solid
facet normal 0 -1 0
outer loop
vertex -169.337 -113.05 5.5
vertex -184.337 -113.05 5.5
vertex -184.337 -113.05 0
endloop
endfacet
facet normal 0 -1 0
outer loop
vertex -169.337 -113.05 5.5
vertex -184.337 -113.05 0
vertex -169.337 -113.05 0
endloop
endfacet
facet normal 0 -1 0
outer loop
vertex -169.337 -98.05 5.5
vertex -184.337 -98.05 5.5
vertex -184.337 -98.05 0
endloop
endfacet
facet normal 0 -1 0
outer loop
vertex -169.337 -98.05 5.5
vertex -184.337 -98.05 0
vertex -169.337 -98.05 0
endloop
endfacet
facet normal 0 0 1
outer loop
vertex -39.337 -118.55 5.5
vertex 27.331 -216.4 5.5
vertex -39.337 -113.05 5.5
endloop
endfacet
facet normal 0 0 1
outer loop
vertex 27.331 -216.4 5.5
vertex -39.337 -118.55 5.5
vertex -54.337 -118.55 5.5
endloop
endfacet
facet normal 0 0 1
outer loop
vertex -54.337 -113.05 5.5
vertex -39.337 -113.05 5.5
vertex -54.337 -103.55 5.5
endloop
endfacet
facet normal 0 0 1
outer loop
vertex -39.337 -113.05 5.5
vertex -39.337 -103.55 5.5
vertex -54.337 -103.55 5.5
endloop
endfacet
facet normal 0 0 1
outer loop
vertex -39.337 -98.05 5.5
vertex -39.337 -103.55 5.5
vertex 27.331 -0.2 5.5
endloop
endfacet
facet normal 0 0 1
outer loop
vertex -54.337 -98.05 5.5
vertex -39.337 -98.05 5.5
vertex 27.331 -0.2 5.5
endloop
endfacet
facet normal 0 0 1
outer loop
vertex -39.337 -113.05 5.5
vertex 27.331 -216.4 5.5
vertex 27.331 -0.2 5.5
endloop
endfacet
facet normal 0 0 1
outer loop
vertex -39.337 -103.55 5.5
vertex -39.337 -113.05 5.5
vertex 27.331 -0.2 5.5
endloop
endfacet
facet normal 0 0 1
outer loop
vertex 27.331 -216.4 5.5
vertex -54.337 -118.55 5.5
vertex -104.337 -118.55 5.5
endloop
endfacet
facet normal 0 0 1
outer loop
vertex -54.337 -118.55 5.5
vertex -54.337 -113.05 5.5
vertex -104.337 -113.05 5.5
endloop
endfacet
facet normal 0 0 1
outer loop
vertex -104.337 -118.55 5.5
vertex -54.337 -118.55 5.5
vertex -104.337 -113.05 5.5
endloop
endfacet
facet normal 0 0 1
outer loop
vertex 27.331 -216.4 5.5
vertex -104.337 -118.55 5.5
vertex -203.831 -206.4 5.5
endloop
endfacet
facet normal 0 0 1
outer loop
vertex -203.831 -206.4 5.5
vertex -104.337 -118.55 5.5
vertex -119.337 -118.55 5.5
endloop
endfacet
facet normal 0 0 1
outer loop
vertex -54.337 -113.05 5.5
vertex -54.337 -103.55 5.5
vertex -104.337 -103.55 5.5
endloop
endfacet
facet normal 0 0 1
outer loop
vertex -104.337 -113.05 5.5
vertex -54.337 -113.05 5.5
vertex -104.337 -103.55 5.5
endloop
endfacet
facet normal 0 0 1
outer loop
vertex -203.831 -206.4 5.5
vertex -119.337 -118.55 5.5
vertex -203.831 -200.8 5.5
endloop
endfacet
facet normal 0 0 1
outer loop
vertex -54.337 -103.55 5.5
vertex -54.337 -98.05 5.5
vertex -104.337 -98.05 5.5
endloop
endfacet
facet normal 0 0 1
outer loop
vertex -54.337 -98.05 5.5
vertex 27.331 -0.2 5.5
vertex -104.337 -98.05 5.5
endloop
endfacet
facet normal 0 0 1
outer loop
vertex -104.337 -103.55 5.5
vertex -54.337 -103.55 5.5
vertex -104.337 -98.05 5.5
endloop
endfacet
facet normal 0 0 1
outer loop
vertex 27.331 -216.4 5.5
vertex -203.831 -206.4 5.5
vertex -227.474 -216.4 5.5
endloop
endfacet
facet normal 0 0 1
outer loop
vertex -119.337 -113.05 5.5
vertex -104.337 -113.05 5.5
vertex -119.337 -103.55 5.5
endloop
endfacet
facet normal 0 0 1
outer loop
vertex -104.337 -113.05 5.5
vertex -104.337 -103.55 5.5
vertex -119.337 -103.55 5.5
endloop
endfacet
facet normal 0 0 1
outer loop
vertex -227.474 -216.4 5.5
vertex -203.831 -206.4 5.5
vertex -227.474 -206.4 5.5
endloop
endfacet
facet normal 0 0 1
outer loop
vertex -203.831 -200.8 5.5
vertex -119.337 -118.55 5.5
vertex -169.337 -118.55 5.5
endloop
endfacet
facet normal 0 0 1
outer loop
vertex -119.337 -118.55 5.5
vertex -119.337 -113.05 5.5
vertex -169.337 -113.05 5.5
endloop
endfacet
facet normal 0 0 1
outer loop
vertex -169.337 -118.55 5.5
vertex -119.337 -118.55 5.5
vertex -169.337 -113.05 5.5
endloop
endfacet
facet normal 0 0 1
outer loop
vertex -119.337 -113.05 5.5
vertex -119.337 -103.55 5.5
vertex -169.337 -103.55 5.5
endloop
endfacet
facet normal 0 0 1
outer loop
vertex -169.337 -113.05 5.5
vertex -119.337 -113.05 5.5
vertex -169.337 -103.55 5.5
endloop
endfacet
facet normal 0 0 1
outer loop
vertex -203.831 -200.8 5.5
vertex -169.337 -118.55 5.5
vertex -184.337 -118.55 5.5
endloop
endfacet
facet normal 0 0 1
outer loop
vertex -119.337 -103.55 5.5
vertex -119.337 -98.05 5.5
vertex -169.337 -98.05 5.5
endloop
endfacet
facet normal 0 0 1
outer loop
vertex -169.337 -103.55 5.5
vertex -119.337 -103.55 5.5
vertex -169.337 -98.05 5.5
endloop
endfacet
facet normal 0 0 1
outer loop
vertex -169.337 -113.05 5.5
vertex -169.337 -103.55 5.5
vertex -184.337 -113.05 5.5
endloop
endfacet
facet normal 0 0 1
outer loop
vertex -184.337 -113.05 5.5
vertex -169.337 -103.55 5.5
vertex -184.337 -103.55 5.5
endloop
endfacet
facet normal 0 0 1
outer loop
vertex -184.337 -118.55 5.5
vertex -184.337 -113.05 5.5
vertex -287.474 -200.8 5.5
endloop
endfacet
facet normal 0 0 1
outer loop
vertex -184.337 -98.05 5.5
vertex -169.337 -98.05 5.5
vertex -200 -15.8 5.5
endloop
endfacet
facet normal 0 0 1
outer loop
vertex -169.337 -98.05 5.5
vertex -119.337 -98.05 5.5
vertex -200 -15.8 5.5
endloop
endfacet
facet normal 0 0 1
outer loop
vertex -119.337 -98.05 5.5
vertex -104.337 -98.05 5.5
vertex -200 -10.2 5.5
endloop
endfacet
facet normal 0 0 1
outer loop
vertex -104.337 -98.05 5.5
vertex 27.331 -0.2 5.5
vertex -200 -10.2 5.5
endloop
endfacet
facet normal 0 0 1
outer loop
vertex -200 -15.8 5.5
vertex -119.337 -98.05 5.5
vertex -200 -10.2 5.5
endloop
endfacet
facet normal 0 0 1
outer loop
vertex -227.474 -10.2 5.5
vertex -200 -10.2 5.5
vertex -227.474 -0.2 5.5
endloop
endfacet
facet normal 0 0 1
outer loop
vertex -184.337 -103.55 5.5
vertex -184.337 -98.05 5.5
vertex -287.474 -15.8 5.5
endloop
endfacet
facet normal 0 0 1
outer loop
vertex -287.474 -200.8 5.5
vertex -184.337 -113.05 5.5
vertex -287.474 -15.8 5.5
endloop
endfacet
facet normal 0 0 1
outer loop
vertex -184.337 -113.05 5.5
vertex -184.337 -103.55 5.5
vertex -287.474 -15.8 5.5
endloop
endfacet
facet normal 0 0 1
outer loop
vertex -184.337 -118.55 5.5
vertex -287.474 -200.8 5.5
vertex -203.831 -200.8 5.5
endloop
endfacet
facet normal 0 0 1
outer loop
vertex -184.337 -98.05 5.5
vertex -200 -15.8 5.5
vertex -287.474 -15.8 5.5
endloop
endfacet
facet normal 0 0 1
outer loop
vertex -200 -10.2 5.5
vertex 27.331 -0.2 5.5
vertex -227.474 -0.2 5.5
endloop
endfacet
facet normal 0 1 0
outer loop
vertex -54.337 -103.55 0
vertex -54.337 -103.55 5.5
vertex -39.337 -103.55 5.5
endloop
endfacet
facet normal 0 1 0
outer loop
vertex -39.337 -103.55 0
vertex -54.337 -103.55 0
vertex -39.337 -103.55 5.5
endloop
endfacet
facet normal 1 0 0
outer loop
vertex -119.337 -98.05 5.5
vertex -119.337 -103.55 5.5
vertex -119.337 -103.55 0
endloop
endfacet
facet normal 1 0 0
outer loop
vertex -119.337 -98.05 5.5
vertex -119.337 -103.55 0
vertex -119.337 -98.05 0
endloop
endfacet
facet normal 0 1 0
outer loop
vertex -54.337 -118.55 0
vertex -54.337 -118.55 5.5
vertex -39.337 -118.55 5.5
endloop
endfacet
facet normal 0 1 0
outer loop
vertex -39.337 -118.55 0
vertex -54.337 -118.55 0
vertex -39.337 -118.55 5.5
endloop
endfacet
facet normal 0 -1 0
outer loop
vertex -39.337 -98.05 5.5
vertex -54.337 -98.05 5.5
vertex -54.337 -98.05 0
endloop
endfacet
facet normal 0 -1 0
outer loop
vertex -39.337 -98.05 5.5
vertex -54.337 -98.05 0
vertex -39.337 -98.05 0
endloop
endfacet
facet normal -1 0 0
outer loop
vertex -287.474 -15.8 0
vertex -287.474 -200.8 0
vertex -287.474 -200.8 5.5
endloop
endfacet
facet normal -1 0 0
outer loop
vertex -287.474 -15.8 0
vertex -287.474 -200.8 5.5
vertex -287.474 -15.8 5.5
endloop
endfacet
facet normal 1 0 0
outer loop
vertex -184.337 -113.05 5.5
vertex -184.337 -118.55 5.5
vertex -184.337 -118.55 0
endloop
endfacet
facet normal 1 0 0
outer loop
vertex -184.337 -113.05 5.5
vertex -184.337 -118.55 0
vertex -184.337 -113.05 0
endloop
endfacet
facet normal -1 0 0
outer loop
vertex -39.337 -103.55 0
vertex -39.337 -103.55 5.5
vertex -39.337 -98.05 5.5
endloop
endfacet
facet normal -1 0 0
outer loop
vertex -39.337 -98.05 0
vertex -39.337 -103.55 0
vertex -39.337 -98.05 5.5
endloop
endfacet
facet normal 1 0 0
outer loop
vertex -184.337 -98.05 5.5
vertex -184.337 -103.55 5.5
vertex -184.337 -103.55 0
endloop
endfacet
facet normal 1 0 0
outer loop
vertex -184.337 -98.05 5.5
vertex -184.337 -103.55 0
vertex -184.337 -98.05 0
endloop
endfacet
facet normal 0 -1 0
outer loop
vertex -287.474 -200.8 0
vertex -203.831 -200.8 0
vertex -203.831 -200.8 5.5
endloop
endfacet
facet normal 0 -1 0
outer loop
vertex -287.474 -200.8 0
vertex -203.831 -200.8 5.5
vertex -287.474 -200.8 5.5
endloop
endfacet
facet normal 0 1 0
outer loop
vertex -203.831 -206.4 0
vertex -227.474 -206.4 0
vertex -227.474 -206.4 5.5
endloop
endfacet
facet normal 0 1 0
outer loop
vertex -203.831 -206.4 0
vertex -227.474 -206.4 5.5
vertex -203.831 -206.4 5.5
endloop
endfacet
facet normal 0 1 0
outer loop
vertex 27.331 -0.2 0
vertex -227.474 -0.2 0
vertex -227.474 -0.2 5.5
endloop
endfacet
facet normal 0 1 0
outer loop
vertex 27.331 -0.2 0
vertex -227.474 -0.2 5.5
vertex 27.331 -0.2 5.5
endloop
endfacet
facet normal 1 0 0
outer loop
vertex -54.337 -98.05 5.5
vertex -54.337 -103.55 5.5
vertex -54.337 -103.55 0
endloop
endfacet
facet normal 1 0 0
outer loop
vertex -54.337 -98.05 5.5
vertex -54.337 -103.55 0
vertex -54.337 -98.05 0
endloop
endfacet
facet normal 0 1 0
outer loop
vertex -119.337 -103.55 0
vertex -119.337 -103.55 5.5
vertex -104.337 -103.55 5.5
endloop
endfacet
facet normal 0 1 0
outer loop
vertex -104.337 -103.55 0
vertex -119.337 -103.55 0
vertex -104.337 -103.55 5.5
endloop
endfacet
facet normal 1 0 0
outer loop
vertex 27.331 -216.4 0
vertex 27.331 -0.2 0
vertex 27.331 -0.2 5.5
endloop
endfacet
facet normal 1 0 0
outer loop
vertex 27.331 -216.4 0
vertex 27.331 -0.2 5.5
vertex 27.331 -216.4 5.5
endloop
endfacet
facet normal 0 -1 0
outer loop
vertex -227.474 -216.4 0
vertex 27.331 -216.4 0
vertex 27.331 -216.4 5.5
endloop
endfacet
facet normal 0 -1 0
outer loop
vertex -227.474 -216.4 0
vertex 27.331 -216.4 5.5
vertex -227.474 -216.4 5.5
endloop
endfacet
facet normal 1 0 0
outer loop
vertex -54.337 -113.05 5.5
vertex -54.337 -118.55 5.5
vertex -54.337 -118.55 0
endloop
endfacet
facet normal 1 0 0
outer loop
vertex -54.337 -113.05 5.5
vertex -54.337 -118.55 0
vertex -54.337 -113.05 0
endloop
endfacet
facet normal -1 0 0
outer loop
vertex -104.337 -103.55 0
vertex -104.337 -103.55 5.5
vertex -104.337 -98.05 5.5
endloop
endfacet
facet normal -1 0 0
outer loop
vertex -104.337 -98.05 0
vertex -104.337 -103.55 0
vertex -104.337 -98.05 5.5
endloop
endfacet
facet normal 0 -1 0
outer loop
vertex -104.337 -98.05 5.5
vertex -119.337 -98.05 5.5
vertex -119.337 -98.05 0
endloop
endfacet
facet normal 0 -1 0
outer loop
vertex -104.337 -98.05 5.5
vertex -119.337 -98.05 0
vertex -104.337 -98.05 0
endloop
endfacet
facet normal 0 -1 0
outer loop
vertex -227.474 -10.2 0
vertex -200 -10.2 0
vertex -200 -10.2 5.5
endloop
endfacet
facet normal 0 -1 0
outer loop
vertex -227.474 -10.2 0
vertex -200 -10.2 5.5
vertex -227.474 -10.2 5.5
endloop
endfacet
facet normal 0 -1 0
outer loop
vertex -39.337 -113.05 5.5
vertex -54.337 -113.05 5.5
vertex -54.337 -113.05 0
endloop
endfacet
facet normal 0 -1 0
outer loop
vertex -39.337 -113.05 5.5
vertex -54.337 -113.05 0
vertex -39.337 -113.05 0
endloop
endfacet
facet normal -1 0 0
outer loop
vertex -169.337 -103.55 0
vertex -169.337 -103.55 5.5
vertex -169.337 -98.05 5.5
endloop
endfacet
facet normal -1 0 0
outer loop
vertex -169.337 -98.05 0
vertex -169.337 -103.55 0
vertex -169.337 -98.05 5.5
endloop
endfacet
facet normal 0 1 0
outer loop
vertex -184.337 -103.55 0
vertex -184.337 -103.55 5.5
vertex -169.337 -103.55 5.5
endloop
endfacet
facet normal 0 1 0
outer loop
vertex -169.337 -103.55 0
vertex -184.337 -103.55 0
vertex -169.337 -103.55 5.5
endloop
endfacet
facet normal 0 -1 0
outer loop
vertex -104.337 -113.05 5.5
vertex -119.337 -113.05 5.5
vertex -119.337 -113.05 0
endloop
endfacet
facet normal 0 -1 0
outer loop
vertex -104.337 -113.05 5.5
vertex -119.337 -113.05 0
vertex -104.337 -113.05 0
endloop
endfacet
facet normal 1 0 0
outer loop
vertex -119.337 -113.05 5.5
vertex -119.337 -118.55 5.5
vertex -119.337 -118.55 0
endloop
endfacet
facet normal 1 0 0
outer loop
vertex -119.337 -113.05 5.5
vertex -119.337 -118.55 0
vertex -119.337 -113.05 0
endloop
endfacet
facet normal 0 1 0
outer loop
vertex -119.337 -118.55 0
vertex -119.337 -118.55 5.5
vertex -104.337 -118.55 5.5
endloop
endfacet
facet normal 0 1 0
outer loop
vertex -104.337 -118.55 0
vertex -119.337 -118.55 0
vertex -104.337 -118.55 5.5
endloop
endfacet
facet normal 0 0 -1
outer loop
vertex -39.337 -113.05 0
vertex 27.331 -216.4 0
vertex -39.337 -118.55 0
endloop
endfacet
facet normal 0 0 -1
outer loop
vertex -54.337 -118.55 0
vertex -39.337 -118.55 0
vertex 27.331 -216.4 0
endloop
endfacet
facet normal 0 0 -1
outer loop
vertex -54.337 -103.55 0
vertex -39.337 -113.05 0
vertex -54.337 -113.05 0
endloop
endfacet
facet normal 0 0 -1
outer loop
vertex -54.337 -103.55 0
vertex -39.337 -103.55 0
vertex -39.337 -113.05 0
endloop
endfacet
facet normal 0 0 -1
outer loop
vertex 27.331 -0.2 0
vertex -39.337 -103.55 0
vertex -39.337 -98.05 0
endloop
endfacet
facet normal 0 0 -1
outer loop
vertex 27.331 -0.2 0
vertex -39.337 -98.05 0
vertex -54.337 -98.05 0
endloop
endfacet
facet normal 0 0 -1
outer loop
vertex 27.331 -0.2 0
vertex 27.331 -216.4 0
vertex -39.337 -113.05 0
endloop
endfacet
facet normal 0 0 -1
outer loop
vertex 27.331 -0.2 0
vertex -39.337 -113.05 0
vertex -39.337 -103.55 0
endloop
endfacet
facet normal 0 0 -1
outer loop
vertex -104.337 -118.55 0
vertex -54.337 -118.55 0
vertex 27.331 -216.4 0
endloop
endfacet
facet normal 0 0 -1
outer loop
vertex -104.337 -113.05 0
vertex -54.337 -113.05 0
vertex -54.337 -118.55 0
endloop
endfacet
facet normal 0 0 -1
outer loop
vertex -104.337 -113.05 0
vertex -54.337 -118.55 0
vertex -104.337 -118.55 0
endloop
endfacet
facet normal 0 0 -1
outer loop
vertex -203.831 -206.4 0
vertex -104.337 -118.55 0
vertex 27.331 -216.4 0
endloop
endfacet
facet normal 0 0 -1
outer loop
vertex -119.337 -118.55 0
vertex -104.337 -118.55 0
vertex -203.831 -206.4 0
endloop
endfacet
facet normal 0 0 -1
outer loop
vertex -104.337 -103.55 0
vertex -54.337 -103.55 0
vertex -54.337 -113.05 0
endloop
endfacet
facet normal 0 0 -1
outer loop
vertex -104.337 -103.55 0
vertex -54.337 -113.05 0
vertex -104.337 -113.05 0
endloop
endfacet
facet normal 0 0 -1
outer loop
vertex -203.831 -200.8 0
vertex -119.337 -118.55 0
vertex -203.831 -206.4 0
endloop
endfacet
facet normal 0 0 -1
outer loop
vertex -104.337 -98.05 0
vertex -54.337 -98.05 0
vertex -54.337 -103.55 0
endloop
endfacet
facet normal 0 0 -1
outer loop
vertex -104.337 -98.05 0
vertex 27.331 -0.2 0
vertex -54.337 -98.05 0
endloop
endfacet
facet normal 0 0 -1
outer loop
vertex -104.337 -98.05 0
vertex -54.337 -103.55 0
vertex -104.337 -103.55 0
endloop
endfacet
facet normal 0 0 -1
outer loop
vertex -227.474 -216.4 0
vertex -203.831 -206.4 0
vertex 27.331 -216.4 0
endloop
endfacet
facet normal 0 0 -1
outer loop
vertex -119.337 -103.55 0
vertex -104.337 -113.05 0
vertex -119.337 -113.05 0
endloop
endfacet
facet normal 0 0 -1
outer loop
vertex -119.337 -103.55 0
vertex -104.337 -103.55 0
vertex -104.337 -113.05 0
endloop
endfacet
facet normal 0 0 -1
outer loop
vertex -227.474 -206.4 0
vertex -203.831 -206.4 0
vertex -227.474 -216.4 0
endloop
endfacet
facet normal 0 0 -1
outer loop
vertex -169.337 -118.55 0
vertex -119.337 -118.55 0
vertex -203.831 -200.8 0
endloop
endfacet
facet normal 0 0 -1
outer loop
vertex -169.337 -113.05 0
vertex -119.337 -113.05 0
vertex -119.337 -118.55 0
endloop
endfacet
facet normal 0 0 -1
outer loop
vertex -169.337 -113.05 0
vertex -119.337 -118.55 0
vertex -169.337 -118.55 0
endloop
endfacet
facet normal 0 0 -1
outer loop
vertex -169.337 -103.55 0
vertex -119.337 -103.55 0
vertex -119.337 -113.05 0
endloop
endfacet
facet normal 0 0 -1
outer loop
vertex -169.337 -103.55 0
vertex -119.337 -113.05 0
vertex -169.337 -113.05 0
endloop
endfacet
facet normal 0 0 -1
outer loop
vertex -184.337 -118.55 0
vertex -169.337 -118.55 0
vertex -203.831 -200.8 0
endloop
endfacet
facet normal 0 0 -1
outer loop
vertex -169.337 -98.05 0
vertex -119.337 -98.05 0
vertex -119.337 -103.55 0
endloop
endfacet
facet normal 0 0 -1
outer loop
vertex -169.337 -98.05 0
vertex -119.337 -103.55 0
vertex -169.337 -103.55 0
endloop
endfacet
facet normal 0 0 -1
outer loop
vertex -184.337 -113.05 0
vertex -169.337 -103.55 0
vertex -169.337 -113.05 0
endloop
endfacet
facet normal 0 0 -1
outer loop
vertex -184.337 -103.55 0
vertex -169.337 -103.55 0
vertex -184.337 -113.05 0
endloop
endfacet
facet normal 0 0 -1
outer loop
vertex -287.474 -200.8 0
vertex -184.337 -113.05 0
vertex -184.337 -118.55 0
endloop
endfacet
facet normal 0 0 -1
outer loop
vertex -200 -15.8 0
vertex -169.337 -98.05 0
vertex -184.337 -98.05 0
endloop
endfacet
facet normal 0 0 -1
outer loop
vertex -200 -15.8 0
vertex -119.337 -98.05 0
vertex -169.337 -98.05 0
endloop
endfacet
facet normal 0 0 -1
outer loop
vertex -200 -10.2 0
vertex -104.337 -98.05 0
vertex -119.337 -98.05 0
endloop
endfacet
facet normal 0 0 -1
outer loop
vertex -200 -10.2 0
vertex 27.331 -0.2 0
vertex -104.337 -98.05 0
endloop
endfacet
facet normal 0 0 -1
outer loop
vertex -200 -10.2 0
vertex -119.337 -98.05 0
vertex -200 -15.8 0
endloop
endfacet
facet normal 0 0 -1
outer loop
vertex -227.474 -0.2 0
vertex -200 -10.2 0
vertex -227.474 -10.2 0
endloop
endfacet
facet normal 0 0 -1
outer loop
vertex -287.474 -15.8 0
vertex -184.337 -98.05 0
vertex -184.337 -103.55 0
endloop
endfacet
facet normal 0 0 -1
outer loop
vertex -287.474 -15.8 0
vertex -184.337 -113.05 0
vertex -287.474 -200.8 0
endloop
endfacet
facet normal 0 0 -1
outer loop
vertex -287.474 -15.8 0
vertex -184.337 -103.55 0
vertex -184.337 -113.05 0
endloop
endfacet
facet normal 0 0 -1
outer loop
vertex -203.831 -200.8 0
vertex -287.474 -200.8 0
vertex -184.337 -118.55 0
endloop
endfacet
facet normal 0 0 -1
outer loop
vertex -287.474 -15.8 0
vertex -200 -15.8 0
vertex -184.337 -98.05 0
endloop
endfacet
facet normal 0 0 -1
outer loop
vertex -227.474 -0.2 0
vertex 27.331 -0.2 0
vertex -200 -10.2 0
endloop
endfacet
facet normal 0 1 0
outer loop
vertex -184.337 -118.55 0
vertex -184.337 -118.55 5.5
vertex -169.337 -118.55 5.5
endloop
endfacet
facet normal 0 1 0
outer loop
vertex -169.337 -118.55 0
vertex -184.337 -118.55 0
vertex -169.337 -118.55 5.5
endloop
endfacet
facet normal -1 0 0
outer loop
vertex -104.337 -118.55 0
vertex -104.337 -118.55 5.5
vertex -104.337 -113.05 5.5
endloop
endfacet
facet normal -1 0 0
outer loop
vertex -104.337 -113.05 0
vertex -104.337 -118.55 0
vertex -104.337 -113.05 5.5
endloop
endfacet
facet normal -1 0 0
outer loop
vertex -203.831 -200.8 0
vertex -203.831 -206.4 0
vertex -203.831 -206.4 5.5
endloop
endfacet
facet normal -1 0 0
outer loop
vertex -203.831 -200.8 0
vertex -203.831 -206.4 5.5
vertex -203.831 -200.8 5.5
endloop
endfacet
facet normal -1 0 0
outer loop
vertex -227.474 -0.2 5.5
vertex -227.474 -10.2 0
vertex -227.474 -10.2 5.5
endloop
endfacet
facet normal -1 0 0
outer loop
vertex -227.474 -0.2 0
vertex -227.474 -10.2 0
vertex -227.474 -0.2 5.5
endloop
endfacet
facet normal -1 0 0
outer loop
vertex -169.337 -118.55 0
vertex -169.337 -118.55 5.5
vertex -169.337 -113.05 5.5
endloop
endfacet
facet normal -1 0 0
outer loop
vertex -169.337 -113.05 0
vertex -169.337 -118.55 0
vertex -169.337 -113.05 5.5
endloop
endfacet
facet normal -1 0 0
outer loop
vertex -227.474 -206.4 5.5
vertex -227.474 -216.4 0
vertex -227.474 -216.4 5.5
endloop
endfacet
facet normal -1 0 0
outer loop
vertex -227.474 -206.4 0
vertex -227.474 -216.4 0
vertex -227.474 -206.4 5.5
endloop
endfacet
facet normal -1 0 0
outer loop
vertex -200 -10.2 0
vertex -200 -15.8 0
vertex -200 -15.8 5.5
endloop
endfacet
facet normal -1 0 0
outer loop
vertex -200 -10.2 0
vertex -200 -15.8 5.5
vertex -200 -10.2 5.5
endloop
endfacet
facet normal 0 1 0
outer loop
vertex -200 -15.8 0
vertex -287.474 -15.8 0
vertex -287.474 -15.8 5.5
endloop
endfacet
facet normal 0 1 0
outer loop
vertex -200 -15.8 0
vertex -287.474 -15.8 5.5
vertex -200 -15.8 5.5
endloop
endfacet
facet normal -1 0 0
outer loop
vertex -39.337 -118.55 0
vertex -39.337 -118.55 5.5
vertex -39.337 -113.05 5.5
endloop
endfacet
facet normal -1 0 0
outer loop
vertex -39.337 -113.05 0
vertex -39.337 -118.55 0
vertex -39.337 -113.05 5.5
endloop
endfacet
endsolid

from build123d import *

# Parameters (mm, degrees)
SALIENTE_EXTRUIR1_DEPTH = 5.5
CROQUIS2_W              = 15
CROQUIS2_H              = 5.5
CORTAR_EXTRUIR2_DEPTH   = 5.5


with BuildPart() as part:
    # Croquis1 → Saliente-Extruir1 (new body)
    with BuildSketch(Plane.XY):
        Polygon((27.331158202, -0.2), (27.331158202, -216.4), (-227.473920626, -216.4), (-227.473920626, -206.4), (-203.831058672, -206.4), (-203.831058672, -200.8), (-287.473920626, -200.8), (-287.473920626, -15.8), (-200, -15.8), (-200, -10.2), (-227.473920626, -10.2), (-227.473920626, -0.2), align=None)
    extrude(amount=SALIENTE_EXTRUIR1_DEPTH)

    # Croquis2 → Cortar-Extruir2 (cut)
    with BuildSketch(Plane.XY.offset(5.5)):
        with Locations((-46.837001408, -115.8)):
            Rectangle(CROQUIS2_W, CROQUIS2_H)
        with Locations((-111.837001408, -100.8)):
            Rectangle(CROQUIS2_W, CROQUIS2_H)
        with Locations((-176.837001408, -100.8)):
            Rectangle(CROQUIS2_W, CROQUIS2_H)
        with Locations((-46.837001408, -100.8)):
            Rectangle(CROQUIS2_W, CROQUIS2_H)
        with Locations((-111.837001408, -115.8)):
            Rectangle(CROQUIS2_W, CROQUIS2_H)
        with Locations((-176.837001408, -115.8)):
            Rectangle(CROQUIS2_W, CROQUIS2_H)
    extrude(amount=-CORTAR_EXTRUIR2_DEPTH, mode=Mode.SUBTRACT)


solid = part.part
